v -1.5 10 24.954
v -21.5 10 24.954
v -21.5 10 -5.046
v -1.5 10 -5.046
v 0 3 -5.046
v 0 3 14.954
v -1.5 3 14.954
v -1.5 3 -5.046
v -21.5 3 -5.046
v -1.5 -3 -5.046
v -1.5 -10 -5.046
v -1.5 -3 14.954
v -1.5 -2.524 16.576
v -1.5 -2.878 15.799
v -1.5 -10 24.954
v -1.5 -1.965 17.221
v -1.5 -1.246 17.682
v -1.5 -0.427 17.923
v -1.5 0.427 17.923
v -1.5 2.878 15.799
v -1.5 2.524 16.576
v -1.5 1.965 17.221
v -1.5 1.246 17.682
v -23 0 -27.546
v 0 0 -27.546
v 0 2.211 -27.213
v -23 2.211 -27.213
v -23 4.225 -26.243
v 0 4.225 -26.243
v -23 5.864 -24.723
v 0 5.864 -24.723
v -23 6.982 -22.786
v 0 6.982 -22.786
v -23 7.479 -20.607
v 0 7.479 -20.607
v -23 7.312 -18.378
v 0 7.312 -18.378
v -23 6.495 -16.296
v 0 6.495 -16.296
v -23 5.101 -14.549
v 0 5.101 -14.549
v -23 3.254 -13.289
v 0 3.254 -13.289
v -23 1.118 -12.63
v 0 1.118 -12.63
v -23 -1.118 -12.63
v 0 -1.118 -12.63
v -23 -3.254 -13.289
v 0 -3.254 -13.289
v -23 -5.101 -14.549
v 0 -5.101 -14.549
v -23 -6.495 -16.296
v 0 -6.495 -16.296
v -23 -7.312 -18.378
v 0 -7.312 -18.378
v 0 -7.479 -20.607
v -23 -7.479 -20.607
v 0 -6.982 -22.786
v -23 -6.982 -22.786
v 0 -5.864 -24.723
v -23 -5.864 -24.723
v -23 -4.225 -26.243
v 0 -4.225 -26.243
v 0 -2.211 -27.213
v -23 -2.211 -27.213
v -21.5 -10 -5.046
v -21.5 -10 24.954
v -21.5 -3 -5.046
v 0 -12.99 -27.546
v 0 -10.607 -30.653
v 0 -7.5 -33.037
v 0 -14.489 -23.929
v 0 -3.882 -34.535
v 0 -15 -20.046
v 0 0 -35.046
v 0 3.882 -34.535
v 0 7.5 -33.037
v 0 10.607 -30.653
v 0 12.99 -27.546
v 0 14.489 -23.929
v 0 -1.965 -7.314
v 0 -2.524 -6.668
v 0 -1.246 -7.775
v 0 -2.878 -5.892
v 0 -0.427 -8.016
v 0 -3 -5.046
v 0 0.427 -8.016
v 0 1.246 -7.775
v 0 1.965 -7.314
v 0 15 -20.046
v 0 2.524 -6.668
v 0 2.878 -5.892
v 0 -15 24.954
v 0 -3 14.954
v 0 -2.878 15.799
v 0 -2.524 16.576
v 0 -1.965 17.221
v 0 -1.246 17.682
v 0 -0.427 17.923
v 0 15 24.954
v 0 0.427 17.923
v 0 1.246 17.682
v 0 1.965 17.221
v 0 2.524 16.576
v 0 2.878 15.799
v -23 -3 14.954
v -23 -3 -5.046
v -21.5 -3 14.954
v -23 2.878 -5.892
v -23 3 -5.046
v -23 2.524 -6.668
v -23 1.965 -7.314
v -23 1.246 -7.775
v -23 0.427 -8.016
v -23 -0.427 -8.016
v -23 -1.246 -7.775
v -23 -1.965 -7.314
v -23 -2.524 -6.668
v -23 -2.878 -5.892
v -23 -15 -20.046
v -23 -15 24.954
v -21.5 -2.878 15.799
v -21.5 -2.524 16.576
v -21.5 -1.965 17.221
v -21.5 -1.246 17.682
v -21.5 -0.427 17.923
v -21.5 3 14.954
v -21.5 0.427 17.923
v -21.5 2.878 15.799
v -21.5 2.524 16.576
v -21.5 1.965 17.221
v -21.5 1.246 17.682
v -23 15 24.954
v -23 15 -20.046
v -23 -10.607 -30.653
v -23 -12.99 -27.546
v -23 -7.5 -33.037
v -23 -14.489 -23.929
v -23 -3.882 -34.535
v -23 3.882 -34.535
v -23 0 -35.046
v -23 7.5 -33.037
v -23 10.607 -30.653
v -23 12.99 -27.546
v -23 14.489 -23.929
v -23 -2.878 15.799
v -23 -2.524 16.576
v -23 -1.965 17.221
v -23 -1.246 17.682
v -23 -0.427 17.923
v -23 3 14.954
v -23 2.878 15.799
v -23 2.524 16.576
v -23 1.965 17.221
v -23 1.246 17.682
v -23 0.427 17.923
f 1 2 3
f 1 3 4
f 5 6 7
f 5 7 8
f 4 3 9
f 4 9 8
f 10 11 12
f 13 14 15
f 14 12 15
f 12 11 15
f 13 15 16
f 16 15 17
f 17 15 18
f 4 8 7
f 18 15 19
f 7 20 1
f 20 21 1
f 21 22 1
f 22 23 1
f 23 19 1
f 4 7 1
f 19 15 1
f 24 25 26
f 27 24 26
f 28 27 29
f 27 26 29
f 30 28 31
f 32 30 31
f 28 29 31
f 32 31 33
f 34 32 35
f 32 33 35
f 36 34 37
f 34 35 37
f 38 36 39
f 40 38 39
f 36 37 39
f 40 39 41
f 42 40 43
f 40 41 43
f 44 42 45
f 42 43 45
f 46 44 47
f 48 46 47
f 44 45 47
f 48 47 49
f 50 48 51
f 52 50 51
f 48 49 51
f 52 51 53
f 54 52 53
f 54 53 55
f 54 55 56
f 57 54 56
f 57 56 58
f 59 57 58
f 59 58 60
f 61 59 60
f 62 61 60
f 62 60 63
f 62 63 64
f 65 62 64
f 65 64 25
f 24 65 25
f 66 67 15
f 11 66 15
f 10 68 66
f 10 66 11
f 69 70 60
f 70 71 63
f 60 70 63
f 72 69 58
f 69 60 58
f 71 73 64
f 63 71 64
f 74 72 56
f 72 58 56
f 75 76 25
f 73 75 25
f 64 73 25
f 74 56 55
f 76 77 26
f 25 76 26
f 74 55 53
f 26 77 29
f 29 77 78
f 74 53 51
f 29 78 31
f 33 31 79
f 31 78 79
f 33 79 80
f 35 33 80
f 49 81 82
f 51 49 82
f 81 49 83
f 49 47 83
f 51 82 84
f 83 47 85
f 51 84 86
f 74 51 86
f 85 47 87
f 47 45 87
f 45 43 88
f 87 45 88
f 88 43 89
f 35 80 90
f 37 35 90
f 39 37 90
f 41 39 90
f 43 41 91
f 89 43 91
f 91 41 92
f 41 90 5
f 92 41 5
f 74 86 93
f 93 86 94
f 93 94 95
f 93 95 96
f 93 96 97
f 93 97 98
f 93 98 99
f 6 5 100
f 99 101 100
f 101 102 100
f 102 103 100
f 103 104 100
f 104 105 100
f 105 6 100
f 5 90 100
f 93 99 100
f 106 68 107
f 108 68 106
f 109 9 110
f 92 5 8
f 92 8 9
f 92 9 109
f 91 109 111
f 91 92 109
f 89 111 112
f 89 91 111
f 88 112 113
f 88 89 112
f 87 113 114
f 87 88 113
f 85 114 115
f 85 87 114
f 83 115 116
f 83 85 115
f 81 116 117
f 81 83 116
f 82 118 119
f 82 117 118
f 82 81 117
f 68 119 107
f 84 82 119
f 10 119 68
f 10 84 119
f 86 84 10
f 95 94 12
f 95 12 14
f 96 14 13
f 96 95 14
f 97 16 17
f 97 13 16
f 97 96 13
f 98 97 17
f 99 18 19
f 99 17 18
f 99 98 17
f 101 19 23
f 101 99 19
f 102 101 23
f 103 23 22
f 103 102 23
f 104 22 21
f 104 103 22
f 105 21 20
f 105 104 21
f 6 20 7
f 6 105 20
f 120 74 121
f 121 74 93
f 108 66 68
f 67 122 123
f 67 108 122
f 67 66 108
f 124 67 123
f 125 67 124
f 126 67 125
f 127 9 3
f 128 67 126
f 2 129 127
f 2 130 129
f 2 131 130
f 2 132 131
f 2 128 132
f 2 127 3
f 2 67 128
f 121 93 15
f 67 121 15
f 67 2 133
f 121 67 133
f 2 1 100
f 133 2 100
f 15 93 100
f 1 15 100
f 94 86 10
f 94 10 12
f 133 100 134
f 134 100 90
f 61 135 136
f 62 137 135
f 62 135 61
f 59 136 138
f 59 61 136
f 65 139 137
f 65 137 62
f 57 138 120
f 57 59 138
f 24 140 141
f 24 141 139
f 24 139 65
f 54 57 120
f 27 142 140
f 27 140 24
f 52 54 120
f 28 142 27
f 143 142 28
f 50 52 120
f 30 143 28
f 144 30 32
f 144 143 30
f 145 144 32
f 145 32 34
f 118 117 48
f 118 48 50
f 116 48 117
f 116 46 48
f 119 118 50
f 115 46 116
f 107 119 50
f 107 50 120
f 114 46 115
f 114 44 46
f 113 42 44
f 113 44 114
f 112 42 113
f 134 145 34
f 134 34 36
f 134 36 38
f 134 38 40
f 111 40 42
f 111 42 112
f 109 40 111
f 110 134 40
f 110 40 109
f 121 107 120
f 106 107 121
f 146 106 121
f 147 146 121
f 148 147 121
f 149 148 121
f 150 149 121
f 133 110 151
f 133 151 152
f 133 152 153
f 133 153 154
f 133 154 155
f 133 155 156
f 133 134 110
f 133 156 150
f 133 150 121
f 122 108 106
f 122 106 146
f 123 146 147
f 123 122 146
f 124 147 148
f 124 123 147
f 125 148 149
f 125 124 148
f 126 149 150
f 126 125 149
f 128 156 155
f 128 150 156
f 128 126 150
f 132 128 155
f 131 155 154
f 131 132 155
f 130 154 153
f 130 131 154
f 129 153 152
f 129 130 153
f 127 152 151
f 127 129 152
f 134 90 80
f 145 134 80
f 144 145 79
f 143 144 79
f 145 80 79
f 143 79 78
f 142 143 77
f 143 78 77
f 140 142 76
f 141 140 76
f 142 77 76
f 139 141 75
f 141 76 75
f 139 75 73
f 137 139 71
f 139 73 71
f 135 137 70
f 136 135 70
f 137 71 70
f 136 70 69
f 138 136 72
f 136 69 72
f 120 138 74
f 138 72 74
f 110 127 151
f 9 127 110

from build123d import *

# Parameters (mm, degrees)
BOSS_EXTRUDE1_DEPTH = 23
CUT_EXTRUDE1_DEPTH  = 45.52248299
SKETCH3_R           = 7.5
CUT_EXTRUDE2_DEPTH  = 45.52248299
SKETCH4_W           = 20
SKETCH4_H           = 20
CUT_EXTRUDE3_DEPTH  = 30


with BuildPart() as part:
    # Sketch1 → Boss-Extrude1 (new body)
    with BuildSketch(Plane(origin=(0, 0, 0), x_dir=(0, 0, -1), z_dir=(1, 0, 0))):
        with BuildLine():
            Line((-24.953580902, 15), (20.046419098, 15))
            ThreePointArc((20.046419098, 15), (35.046419098, 0), (20.046419098, -15))
            Line((20.046419098, -15), (-24.953580902, -15))
            Line((-24.953580902, -15), (-24.953580902, 15))
        make_face()
    extrude(amount=-BOSS_EXTRUDE1_DEPTH)

    # Sketch2 → Cut-Extrude1 (cut, through all)
    with BuildSketch(Plane(origin=(0, 0, 0), x_dir=(0, 0, -1), z_dir=(1, 0, 0))):
        with BuildLine():
            Line((-14.953580902, 3), (5.046419098, 3))
            ThreePointArc((5.046419098, 3), (8.046419098, 0), (5.046419098, -3))
            Line((5.046419098, -3), (-14.953580902, -3))
            ThreePointArc((-14.953580902, -3), (-17.953580902, 0), (-14.953580902, 3))
        make_face()
    extrude(amount=-CUT_EXTRUDE1_DEPTH, mode=Mode.SUBTRACT)

    # Sketch3 → Cut-Extrude2 (cut, through all)
    with BuildSketch(Plane(origin=(0, 0, 0), x_dir=(0, 0, -1), z_dir=(1, 0, 0))):
        with Locations((20.046419098, 0)):
            Circle(SKETCH3_R)
    extrude(amount=-CUT_EXTRUDE2_DEPTH, mode=Mode.SUBTRACT)

    # Sketch4 → Cut-Extrude3 (cut)
    with BuildSketch(Plane.XY.offset(24.953580902)):
        with Locations((-11.5, 0)):
            Rectangle(SKETCH4_W, SKETCH4_H)
    extrude(amount=-CUT_EXTRUDE3_DEPTH, mode=Mode.SUBTRACT)


solid = part.part
